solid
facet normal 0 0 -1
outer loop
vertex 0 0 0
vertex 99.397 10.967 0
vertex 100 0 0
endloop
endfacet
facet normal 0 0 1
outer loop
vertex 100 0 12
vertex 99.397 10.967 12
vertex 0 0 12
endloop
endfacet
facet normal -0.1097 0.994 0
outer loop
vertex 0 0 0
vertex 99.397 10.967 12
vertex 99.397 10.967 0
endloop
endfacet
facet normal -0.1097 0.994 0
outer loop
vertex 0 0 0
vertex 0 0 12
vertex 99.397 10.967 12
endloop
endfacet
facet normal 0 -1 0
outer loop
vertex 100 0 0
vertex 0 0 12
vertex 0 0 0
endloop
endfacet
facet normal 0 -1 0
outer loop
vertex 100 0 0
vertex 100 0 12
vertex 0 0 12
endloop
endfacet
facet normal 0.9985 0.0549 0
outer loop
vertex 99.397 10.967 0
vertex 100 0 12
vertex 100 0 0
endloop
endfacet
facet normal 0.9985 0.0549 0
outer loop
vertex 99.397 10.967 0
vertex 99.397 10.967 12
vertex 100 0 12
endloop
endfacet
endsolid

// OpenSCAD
width = 12;
end = 11;
length = 100;

angle = 2 * atan(end/2/length);
echo(angle);

linear_extrude(height=width) {
    polygon([[0,0],[length,0],length*[cos(angle),sin(angle)]]);
}
